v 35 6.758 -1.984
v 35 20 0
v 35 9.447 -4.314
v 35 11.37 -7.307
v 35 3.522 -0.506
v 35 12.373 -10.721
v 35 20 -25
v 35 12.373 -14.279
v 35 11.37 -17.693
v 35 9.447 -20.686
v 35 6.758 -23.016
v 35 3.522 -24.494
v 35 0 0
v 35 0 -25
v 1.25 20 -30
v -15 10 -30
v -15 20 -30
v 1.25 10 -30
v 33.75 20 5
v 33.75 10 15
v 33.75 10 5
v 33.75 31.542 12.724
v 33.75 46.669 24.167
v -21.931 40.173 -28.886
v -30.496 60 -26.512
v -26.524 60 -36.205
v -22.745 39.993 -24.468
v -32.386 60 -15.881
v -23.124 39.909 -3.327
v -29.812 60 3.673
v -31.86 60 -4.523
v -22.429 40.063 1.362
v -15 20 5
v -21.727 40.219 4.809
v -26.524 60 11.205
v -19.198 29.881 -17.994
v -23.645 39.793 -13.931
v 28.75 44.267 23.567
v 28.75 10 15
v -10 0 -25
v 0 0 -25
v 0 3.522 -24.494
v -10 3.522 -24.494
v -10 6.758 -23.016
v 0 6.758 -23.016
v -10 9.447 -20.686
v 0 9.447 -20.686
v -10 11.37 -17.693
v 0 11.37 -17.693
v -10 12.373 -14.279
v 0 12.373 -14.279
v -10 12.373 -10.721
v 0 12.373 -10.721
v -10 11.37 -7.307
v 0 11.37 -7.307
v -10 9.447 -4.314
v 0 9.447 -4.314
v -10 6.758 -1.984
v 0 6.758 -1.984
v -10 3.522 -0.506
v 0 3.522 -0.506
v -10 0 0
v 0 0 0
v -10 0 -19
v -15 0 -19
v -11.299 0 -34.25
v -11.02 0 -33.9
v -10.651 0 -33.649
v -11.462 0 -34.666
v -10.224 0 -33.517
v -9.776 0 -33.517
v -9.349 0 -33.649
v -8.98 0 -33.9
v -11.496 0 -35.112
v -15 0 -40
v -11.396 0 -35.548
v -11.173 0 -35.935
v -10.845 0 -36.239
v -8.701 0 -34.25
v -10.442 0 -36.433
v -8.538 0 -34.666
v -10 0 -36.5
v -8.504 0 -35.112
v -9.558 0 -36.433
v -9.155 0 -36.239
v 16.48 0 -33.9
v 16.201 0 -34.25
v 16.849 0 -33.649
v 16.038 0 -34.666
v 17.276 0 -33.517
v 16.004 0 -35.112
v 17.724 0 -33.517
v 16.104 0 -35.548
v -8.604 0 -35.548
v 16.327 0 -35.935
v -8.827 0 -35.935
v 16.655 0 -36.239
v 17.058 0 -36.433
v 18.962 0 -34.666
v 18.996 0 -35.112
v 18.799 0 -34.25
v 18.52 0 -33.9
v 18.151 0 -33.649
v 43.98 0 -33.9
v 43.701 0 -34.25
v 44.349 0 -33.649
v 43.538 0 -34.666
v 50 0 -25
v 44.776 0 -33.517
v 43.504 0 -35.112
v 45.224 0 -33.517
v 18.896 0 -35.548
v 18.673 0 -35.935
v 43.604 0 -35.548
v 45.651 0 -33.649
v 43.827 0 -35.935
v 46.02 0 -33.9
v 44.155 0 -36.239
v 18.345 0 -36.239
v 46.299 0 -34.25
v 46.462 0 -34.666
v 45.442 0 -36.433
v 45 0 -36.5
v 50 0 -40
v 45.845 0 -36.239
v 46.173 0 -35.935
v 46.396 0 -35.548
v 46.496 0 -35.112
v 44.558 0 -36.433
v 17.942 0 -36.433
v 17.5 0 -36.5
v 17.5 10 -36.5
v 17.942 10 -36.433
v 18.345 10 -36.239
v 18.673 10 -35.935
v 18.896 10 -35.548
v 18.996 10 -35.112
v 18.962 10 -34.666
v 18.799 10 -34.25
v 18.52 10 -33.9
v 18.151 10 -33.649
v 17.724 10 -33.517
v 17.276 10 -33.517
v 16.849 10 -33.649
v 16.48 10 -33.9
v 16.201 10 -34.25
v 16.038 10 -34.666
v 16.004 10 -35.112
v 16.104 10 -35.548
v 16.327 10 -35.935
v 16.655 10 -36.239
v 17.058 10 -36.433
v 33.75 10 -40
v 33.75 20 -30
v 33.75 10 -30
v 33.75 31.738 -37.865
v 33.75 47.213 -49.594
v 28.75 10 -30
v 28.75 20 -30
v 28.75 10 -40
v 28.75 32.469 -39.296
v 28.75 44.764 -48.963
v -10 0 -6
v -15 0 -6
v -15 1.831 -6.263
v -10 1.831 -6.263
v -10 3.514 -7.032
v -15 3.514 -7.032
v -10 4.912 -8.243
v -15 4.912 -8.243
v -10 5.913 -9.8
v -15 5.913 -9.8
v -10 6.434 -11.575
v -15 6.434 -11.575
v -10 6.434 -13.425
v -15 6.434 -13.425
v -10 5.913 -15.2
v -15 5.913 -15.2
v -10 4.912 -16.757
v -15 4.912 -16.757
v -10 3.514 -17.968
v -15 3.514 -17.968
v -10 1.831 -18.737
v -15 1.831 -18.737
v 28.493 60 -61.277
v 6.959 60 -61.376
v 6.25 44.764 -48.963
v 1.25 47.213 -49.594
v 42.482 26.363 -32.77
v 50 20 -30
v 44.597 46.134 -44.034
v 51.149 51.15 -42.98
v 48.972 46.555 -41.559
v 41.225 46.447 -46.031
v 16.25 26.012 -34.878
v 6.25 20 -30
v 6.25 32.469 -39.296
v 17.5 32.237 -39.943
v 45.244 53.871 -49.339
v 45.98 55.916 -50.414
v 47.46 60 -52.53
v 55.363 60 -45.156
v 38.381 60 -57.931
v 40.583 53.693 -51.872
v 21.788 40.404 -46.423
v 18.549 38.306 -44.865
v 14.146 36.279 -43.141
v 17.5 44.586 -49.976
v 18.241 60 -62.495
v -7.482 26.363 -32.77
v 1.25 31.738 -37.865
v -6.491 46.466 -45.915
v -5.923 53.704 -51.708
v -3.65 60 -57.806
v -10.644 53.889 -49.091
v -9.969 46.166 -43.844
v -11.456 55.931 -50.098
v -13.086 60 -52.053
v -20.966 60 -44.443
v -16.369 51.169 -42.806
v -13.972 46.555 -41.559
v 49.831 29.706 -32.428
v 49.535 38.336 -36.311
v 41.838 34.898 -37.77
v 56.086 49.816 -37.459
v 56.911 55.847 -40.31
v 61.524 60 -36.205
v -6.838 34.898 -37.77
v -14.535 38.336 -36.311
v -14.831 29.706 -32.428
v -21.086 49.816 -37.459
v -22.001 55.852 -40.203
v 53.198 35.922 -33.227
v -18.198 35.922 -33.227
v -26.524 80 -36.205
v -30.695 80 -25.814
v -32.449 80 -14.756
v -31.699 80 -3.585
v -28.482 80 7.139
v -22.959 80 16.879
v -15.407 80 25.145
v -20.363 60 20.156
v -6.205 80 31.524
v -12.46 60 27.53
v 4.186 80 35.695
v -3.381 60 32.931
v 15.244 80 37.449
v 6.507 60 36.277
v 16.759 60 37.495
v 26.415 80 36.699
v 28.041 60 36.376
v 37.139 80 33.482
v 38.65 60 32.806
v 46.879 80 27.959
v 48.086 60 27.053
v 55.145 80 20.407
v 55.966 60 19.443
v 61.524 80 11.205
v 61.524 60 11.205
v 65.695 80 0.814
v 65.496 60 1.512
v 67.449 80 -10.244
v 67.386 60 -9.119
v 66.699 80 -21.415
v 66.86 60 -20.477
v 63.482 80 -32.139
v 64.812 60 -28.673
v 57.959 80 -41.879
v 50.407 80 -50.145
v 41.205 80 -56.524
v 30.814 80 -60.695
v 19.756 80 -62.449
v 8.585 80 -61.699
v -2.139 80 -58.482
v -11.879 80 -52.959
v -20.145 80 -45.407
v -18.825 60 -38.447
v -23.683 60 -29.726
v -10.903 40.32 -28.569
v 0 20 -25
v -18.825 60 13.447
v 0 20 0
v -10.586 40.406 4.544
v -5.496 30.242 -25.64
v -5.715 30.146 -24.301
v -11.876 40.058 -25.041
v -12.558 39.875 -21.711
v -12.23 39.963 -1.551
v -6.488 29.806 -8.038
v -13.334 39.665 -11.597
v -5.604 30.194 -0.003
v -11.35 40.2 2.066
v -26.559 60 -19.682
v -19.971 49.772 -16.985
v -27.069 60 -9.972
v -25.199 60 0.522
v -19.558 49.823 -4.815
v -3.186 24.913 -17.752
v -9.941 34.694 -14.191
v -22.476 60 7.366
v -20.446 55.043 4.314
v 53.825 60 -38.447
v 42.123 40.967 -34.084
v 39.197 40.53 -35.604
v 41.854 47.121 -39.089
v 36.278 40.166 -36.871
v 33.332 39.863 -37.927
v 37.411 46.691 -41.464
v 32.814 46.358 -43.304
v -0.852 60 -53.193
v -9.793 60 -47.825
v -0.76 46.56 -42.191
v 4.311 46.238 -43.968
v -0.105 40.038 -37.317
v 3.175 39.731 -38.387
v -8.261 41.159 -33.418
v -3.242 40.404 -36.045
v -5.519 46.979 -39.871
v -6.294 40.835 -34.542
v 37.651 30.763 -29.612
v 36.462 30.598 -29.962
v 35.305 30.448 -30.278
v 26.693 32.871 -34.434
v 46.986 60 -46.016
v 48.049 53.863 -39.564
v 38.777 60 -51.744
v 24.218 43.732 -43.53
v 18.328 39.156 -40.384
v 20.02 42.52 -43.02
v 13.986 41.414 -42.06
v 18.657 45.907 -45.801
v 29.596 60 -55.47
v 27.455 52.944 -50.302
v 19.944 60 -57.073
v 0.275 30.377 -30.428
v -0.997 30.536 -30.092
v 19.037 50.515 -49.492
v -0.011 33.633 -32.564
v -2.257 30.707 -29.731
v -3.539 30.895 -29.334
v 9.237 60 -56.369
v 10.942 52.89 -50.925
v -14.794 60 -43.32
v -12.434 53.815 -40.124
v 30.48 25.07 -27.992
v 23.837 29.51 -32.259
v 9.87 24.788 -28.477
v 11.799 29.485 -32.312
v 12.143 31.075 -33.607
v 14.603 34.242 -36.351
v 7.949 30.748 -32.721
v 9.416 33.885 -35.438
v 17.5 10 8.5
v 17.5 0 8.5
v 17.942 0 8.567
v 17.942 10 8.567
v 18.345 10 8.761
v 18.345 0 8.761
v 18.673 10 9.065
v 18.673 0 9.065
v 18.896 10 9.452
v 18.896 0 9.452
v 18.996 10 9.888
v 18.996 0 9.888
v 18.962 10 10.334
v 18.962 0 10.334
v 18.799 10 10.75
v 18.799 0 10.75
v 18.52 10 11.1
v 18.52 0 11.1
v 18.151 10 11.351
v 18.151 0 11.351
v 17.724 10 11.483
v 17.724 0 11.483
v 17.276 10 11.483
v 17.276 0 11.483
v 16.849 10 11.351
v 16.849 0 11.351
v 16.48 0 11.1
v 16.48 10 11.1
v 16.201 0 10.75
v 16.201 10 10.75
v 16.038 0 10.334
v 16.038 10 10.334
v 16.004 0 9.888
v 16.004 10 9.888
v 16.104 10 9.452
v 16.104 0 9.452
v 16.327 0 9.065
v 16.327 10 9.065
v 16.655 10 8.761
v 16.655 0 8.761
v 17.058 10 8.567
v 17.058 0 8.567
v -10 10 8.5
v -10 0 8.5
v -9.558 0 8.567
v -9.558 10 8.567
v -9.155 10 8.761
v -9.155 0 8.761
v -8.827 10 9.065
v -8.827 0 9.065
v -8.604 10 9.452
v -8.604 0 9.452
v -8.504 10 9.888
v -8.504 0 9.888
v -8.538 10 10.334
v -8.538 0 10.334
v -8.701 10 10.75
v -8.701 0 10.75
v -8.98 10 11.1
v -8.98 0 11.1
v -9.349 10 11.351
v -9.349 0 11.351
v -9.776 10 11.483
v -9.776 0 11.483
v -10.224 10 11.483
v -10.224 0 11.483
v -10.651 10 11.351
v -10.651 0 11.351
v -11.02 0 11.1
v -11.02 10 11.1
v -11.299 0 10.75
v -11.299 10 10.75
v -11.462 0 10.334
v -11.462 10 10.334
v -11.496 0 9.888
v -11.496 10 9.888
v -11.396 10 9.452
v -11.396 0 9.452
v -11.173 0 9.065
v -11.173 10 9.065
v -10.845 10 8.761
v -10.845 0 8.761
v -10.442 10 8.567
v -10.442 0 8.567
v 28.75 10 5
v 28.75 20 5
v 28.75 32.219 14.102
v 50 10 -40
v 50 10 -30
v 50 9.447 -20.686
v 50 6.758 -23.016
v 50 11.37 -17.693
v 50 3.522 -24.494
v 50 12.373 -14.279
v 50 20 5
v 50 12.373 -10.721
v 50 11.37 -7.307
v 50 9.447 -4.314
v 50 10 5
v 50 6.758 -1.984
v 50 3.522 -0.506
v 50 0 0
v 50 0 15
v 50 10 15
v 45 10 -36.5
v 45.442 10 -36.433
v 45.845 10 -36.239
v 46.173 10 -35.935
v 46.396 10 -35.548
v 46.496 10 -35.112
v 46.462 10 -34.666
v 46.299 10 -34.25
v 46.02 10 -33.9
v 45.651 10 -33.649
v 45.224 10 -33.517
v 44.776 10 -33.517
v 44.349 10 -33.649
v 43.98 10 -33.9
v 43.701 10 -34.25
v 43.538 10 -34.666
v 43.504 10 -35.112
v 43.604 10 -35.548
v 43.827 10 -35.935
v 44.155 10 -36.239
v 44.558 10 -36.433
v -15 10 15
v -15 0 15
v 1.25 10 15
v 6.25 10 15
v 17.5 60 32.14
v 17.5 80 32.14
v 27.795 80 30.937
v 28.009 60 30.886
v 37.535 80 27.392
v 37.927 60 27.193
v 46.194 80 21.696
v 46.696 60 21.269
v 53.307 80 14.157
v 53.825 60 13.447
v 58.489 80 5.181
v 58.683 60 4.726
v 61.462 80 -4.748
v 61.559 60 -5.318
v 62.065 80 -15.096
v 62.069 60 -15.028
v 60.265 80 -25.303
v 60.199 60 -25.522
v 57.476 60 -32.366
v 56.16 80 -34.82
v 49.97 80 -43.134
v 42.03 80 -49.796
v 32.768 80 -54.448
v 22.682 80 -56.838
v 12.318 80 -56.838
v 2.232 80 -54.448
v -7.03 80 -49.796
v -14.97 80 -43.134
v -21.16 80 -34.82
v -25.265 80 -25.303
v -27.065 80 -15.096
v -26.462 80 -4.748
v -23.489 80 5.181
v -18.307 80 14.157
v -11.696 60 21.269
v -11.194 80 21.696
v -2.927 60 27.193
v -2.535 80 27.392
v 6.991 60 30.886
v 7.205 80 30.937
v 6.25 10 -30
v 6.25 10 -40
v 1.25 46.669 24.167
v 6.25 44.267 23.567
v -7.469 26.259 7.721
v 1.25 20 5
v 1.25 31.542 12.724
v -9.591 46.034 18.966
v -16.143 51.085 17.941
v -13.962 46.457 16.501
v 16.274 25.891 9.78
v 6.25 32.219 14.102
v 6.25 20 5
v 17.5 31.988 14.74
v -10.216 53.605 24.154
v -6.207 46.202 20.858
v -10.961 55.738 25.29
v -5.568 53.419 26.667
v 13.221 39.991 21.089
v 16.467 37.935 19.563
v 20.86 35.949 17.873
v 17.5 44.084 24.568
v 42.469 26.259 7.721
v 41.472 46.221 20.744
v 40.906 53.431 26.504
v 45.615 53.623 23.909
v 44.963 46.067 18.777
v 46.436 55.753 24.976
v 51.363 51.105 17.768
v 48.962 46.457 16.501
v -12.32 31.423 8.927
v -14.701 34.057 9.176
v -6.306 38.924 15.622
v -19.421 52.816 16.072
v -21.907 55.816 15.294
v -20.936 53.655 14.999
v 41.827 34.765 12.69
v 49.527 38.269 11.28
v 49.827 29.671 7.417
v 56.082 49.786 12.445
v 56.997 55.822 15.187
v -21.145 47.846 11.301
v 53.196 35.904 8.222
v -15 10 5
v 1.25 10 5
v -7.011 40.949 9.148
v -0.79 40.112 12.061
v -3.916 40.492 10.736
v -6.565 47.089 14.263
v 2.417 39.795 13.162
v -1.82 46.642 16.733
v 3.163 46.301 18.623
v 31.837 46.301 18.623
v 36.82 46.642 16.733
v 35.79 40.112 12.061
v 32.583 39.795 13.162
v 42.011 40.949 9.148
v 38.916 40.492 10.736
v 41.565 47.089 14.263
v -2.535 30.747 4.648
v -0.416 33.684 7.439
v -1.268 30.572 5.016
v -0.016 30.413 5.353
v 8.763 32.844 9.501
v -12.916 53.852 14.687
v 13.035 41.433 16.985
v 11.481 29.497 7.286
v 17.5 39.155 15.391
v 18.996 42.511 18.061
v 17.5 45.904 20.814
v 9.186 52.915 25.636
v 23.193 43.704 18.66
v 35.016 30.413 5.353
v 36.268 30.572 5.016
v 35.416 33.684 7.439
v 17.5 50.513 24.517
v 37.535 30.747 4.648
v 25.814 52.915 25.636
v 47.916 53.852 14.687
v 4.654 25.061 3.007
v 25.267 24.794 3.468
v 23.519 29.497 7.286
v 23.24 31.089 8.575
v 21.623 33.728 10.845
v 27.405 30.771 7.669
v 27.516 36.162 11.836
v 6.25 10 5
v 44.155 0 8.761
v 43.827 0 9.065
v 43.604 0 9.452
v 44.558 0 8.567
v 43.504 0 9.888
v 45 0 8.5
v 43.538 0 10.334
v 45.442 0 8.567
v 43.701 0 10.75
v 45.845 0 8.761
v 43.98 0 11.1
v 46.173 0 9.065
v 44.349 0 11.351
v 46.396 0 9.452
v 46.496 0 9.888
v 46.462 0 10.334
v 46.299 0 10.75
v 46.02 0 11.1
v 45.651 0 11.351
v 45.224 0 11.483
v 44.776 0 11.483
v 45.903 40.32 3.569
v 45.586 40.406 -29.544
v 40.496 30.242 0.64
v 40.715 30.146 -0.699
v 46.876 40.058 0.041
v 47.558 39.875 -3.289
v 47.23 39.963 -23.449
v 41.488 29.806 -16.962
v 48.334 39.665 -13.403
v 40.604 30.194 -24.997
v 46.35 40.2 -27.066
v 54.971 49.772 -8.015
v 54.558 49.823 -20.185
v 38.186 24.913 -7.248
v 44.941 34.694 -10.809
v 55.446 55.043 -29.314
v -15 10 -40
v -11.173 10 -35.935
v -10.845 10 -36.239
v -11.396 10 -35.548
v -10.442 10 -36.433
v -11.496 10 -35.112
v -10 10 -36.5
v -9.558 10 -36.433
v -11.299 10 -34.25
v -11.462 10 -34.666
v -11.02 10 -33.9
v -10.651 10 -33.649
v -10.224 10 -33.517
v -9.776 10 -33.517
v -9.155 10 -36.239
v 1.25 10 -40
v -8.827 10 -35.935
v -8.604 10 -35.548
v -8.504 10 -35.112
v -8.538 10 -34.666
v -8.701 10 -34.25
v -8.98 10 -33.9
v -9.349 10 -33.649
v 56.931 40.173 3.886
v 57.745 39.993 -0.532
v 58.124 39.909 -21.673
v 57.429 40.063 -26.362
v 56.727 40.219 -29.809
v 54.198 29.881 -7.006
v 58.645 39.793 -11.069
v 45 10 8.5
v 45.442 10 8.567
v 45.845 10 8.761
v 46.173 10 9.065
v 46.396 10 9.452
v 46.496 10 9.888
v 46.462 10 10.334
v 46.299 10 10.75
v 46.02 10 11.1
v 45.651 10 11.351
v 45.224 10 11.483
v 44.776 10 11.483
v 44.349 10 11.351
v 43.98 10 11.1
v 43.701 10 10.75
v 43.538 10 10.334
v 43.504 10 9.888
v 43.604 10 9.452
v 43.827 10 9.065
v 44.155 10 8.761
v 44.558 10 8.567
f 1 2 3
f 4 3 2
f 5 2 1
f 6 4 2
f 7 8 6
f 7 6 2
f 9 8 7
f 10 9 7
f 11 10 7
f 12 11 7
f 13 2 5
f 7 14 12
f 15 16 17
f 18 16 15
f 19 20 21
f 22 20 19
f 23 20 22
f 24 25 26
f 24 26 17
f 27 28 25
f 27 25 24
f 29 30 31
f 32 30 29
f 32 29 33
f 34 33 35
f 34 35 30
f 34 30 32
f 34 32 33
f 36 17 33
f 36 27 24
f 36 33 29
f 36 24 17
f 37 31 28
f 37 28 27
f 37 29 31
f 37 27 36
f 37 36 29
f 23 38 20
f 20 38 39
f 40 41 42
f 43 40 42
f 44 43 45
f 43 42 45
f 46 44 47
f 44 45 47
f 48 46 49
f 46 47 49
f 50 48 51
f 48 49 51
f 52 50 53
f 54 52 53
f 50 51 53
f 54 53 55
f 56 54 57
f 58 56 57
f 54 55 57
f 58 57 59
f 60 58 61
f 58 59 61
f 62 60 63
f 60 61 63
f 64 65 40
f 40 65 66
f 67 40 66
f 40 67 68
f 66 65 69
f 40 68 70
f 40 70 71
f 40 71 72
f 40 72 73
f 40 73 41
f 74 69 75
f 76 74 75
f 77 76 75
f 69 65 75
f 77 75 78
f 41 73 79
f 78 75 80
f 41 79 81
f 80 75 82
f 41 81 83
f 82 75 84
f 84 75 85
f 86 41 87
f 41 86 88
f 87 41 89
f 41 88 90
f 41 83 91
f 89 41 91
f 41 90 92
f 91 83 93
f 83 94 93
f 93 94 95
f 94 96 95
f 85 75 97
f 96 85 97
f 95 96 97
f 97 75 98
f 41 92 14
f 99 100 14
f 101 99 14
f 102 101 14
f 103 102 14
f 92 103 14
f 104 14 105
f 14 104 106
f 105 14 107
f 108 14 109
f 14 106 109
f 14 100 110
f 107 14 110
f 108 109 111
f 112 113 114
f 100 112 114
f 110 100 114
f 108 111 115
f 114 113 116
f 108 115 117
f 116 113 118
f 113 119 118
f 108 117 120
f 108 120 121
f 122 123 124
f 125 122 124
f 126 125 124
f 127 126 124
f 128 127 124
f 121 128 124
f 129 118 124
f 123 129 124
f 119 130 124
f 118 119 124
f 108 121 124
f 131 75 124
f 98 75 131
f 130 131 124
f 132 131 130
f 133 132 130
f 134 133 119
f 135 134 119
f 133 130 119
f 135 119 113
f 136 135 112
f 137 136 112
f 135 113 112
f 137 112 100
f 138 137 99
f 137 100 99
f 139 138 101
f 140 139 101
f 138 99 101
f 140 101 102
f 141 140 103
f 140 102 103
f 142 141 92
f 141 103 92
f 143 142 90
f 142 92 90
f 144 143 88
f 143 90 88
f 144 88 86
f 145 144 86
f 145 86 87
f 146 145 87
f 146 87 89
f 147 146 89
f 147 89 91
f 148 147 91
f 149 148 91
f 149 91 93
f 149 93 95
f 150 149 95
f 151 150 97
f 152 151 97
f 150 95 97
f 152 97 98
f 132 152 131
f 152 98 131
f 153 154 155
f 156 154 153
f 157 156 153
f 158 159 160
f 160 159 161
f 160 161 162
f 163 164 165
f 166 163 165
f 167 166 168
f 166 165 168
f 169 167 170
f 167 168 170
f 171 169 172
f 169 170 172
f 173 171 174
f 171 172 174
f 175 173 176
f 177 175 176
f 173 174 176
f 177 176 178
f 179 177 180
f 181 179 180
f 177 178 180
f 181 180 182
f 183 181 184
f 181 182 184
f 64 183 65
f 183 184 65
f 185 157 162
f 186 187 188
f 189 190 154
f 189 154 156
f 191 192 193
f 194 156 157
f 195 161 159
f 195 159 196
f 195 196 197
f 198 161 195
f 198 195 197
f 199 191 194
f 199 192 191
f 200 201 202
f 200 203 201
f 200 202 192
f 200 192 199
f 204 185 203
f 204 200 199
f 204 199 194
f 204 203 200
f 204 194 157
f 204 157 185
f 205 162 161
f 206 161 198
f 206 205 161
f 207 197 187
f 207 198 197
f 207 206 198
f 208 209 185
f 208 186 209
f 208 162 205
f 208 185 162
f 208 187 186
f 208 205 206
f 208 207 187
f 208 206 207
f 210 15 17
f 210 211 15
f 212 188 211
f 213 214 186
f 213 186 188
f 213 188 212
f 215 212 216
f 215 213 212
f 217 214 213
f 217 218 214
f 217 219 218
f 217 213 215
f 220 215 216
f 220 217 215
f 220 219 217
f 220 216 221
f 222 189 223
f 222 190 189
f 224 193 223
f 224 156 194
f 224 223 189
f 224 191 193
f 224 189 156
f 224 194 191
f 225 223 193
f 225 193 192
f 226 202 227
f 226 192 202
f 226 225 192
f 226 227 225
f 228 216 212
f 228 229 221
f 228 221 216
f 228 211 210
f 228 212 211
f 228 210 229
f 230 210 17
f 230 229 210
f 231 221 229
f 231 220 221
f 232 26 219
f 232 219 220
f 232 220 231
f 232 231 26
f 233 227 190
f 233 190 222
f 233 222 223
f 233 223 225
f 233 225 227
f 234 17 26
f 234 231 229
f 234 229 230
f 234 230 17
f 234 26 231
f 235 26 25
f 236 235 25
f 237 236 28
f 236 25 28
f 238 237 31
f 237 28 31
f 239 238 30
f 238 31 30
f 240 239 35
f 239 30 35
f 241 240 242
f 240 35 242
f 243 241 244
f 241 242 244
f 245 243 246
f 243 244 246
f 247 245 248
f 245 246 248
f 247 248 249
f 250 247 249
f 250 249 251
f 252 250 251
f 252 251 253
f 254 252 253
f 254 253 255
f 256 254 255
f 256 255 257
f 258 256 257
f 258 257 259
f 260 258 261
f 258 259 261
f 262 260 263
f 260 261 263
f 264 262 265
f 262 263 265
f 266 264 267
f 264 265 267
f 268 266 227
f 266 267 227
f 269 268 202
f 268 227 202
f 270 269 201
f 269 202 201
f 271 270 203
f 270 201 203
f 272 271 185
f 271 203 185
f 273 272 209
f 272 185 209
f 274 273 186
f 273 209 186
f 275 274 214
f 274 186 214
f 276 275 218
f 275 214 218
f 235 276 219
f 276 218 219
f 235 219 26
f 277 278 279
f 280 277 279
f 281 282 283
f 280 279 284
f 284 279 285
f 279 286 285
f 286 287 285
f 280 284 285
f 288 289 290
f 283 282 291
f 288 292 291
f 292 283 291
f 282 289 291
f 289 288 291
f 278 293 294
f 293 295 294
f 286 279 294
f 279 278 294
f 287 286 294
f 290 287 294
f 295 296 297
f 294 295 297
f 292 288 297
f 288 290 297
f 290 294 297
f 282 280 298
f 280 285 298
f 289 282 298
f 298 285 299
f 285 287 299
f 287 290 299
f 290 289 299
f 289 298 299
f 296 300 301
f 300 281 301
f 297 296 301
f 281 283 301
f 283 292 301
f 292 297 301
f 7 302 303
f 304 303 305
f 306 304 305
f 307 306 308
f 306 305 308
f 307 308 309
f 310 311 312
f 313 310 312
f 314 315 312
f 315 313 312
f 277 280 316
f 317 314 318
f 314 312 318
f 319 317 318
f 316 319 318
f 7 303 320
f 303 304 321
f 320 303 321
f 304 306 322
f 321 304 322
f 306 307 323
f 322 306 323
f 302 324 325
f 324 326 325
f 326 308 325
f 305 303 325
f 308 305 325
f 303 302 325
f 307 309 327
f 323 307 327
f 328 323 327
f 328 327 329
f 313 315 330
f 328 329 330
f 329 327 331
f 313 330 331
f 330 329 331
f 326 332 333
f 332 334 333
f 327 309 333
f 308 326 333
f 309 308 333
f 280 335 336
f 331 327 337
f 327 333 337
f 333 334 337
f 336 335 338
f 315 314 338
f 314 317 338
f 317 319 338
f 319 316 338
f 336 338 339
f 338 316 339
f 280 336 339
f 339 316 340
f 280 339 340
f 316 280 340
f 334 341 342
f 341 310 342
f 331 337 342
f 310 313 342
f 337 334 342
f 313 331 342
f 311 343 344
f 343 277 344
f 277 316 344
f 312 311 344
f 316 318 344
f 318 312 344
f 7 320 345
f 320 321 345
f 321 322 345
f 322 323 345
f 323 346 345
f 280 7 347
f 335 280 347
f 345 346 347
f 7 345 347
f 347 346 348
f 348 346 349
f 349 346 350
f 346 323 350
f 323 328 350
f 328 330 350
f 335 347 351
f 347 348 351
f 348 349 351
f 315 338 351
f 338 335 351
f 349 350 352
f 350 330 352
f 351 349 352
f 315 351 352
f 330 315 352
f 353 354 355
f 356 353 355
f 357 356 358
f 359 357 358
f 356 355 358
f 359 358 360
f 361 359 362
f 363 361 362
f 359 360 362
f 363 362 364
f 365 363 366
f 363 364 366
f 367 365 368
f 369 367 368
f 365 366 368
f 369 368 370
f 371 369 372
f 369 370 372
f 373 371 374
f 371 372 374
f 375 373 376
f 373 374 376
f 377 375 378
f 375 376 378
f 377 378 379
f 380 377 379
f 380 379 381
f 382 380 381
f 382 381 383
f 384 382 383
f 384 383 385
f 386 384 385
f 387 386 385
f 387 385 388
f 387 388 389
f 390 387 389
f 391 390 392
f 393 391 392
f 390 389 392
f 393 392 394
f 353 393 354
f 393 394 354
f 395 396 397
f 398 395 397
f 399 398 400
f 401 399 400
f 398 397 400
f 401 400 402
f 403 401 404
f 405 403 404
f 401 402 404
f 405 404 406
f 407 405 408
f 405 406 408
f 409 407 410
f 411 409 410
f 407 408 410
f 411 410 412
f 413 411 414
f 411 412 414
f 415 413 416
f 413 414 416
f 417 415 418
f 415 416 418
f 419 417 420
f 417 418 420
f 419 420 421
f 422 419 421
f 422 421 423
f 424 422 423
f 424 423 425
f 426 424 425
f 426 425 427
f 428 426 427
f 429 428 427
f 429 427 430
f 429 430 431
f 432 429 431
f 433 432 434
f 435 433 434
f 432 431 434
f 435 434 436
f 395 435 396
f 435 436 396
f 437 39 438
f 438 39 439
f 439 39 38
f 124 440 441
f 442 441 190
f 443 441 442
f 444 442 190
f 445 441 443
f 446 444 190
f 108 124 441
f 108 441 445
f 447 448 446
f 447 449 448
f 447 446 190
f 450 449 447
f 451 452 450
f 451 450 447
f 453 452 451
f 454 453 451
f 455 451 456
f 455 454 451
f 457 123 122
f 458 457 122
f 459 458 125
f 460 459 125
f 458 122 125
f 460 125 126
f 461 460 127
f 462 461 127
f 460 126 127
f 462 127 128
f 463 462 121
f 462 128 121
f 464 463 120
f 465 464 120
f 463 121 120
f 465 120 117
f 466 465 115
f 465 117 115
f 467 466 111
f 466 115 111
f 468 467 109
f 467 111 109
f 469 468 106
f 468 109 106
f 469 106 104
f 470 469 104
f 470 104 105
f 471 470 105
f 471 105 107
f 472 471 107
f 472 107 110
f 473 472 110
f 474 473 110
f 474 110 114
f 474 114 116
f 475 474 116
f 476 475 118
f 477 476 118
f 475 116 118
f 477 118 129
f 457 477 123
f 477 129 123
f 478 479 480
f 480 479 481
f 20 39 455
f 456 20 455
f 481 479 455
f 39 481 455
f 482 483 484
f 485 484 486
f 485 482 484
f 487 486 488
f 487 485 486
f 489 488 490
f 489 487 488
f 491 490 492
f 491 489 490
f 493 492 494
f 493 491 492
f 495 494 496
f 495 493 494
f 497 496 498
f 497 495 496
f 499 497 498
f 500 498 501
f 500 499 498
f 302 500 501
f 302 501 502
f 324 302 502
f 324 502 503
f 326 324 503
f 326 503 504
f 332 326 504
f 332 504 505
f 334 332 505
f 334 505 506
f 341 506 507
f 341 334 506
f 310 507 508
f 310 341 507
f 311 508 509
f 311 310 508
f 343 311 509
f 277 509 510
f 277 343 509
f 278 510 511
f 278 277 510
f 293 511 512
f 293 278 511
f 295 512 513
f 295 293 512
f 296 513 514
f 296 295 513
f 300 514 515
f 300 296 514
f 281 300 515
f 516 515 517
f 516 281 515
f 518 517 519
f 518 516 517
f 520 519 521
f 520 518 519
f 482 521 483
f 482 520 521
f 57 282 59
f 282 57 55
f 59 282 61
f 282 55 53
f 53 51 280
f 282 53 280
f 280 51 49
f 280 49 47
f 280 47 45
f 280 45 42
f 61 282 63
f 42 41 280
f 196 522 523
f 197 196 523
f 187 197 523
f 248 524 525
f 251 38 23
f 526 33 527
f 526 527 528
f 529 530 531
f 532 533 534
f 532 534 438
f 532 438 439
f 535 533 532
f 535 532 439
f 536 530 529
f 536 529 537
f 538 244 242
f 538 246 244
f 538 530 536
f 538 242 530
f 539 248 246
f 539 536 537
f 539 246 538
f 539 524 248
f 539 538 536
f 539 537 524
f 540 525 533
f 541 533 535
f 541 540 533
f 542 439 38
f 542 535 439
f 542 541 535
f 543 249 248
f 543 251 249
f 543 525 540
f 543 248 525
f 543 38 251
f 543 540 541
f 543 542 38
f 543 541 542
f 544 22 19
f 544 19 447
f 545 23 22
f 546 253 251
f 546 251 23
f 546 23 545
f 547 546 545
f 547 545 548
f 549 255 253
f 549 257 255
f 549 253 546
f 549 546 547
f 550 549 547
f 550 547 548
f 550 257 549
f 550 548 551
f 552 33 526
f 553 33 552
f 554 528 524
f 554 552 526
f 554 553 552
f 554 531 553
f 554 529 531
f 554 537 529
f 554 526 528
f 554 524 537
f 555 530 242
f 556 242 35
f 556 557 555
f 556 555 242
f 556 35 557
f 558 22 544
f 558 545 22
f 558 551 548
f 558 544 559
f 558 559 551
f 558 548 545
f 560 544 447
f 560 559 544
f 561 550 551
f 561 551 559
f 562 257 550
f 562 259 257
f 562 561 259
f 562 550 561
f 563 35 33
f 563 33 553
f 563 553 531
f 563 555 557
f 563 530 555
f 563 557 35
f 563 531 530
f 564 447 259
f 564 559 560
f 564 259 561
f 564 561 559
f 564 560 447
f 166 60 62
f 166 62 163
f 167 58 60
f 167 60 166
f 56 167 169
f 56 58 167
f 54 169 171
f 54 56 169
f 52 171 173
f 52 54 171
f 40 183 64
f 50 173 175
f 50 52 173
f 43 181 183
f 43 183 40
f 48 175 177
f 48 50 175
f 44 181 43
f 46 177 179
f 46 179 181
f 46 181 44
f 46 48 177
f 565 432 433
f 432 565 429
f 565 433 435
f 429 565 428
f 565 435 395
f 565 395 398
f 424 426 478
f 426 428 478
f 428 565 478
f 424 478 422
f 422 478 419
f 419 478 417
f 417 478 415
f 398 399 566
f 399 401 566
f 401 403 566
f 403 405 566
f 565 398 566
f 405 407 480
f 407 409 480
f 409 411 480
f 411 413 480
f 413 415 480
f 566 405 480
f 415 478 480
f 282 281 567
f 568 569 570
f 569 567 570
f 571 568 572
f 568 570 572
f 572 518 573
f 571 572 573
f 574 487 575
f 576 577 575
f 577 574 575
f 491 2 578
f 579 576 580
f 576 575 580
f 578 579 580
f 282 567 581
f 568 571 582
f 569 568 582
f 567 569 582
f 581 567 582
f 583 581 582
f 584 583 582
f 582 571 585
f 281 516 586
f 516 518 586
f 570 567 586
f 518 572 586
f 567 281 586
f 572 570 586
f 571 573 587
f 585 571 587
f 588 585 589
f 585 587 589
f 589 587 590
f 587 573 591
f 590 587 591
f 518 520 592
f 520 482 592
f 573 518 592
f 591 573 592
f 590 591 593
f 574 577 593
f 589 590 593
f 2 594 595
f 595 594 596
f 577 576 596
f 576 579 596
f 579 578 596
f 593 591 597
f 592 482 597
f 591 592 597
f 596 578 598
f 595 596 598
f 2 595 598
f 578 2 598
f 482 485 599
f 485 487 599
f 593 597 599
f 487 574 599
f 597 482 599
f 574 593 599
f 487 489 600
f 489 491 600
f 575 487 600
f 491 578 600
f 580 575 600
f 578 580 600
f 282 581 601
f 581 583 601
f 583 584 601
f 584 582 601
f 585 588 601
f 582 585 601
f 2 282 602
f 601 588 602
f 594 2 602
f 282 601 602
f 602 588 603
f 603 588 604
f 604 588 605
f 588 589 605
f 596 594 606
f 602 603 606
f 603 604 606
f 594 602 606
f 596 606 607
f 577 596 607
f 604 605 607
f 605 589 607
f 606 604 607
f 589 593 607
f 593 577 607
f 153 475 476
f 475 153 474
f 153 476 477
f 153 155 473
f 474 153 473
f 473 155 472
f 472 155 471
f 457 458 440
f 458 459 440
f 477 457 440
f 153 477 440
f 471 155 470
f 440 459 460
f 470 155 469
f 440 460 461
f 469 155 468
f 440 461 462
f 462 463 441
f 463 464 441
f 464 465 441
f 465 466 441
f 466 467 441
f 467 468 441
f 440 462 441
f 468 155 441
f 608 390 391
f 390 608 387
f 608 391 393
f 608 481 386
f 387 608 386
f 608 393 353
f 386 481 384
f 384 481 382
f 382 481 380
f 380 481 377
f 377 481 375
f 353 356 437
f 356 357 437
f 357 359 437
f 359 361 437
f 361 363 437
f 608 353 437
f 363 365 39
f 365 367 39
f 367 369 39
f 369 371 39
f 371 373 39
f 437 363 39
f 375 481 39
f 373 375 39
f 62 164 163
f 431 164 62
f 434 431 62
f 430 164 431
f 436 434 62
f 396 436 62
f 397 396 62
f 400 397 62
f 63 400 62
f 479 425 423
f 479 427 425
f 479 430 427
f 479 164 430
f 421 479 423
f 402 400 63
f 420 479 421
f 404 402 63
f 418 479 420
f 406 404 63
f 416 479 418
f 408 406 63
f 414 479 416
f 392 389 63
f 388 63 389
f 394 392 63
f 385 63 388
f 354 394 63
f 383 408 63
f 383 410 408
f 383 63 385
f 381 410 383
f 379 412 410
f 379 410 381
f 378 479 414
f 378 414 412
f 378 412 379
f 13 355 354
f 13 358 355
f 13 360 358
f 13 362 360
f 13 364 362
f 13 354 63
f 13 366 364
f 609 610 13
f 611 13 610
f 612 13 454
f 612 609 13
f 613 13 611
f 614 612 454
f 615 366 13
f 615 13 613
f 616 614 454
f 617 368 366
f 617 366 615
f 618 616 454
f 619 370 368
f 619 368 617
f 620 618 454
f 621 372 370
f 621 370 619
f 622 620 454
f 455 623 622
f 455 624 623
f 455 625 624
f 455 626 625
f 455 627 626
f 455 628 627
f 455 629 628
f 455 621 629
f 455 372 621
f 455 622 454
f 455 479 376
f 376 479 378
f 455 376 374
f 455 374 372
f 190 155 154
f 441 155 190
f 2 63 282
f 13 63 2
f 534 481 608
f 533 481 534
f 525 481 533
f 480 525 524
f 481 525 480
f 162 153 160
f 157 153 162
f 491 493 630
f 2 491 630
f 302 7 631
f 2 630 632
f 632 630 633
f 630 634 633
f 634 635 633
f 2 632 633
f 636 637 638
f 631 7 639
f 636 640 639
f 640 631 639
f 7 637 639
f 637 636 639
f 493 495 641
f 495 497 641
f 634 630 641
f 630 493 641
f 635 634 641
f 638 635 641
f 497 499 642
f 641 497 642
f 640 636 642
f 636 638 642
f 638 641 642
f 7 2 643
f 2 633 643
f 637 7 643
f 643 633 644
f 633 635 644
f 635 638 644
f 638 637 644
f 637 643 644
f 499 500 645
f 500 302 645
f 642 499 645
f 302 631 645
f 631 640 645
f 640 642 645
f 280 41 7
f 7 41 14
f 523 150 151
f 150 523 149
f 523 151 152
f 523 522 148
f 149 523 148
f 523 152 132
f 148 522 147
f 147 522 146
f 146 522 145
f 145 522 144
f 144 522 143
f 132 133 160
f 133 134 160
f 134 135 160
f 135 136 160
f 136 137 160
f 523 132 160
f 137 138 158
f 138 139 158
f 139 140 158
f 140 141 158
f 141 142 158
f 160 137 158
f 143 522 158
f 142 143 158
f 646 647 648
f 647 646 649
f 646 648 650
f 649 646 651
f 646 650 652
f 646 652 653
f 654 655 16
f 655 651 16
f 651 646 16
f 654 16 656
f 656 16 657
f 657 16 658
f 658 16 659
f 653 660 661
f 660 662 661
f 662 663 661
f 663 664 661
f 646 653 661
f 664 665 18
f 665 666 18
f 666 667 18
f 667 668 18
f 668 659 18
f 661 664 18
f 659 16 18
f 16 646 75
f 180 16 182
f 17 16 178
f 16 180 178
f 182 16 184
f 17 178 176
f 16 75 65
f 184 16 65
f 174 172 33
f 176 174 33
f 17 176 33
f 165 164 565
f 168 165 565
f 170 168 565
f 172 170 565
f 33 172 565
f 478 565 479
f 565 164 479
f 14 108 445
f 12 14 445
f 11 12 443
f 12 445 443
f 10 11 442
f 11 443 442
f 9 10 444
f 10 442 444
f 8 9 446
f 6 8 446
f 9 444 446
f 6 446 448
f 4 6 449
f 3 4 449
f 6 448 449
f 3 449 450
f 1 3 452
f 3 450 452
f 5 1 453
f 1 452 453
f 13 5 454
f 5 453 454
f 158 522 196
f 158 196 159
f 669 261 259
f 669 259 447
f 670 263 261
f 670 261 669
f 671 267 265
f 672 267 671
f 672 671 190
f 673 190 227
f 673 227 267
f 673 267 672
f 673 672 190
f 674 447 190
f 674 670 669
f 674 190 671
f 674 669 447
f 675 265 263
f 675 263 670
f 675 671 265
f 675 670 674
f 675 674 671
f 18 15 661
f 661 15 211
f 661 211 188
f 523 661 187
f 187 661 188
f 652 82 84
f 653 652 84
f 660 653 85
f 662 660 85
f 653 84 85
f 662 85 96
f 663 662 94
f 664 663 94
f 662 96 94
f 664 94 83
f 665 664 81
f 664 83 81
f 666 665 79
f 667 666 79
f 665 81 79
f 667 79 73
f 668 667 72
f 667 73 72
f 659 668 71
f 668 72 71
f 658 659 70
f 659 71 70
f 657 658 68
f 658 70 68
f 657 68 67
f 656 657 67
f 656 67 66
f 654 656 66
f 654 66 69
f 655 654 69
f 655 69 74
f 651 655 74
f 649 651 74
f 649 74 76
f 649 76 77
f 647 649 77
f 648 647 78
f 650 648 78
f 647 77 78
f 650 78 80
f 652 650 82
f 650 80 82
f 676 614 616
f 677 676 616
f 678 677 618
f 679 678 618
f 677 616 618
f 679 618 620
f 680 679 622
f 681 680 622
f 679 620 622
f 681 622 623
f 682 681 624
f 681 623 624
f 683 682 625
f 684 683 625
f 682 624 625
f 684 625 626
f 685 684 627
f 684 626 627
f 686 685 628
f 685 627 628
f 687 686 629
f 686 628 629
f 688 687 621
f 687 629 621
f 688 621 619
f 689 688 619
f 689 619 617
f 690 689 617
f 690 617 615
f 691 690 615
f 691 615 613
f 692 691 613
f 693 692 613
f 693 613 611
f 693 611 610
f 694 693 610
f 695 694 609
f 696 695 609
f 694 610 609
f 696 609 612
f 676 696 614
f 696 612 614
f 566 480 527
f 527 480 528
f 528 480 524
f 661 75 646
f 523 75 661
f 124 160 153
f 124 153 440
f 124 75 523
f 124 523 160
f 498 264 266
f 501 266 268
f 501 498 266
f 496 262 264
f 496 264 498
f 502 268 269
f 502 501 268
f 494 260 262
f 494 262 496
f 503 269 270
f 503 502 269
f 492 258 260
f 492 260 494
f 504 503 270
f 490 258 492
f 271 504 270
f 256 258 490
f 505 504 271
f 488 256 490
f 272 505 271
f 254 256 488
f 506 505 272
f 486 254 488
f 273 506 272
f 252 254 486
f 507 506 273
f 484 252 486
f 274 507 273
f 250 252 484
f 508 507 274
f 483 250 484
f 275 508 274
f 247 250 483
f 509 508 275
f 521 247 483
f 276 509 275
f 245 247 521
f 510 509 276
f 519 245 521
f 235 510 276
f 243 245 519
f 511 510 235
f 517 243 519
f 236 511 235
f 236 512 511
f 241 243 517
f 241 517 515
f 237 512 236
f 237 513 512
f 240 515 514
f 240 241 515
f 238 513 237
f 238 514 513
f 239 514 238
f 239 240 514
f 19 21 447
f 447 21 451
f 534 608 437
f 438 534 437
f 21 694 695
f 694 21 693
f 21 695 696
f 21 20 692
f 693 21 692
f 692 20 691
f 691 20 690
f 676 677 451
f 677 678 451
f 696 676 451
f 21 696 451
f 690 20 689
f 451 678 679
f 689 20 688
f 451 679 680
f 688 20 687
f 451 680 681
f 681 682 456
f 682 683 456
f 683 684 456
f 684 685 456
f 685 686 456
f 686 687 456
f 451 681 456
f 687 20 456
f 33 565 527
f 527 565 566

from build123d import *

# Parameters (mm, degrees)
CROQUIS2_W              = 65
CROQUIS2_H              = 35
CROQUIS2_W_2            = 35
CROQUIS2_H_2            = 25
SALIENTE_EXTRUIR1_DEPTH = 20
CROQUIS3_R              = 12.5
CORTAR_EXTRUIR1_DEPTH   = 60
CROQUIS4_R              = 6.5
CORTAR_EXTRUIR2_DEPTH   = 5
CROQUIS10_R             = 50
CROQUIS10_R_2           = 44.640302452
SALIENTE_EXTRUIR2_DEPTH = 20
CROQUIS11_W             = 65
CROQUIS11_H             = 10
CROQUIS11_R             = 1.5
SALIENTE_EXTRUIR3_DEPTH = 10
SALIENTE_EXTRUIR4_DEPTH = 2.5


with BuildPart() as part:
    # Croquis2 → Saliente-Extruir1 (new body)
    with BuildSketch(Plane(origin=(0, 0, 0), x_dir=(1, 0, 0), z_dir=(0, 1, 0))):
        with Locations((17.5, 12.5)):
            Rectangle(CROQUIS2_W, CROQUIS2_H)
        with Locations((17.5, 12.5)):
            Rectangle(CROQUIS2_W_2, CROQUIS2_H_2, mode=Mode.SUBTRACT)
    extrude(amount=SALIENTE_EXTRUIR1_DEPTH)

    # Croquis3 → Cortar-Extruir1 (cut)
    with BuildSketch(Plane(origin=(50, 0, 0), x_dir=(0, 0, -1), z_dir=(1, 0, 0))):
        with Locations((12.5, 0)):
            Circle(CROQUIS3_R)
    extrude(amount=-CORTAR_EXTRUIR1_DEPTH, mode=Mode.SUBTRACT)

    # Croquis4 → Cortar-Extruir2 (cut)
    with BuildSketch(Plane.ZY.offset(15)):
        with Locations((-12.5, 0)):
            Circle(CROQUIS4_R)
    extrude(amount=-CORTAR_EXTRUIR2_DEPTH, mode=Mode.SUBTRACT)

    # Croquis5 → Recubrir2 section 0
    with BuildSketch(Plane(origin=(0, 20, 0), x_dir=(1, 0, 0), z_dir=(0, 1, 0))):
        with BuildLine():
            Line((-15, -5), (50, -5))
            Line((50, -5), (50, 30))
            Line((50, 30), (-15, 30))
            Line((-15, 30), (-15, -5))
        make_face()
    # Croquis6 for Recubrir2 → Recubrir2 section 1
    with BuildSketch(Plane(origin=(0, 60, 0), x_dir=(1, 0, 0), z_dir=(0, 1, 0))):
        with BuildLine():
            # circular arc as an exact rational Bezier (weights 1, cos(half-angle), 1)
            Bezier((-26.523554996, -11.204991152), (17.5, -92.963021858), (61.523554996, -11.204991152), weights=[1, 0.474099823, 1])
            Bezier((61.523554996, -11.204991152), (74.287781001, 12.5), (61.523554996, 36.204991152), weights=[1, 0.8804711, 1])
            Bezier((61.523554996, 36.204991152), (17.5, 117.963021858), (-26.523554996, 36.204991152), weights=[1, 0.474099823, 1])
            Bezier((-26.523554996, 36.204991152), (-39.287781001, 12.5), (-26.523554996, -11.204991152), weights=[1, 0.8804711, 1])
        make_face()
    loft()

    # Croquis10 → Saliente-Extruir2 (add)
    with BuildSketch(Plane(origin=(0, 60, 0), x_dir=(1, 0, 0), z_dir=(0, 1, 0))):
        with Locations(Location((17.5, 12.5, 0), (0, 0, 151.699244219))):
            Circle(CROQUIS10_R)
        with Locations(Location((17.5, 12.5, 0), (0, 0, 270))):
            Circle(CROQUIS10_R_2, mode=Mode.SUBTRACT)
    extrude(amount=SALIENTE_EXTRUIR2_DEPTH)

    # Croquis11 → Saliente-Extruir3 (add)
    # profile 1 of 2: a face of its own
    with BuildSketch(Plane.XZ):
        with Locations((17.5, 10)):
            Rectangle(CROQUIS11_W, CROQUIS11_H)
        with Locations(Location((45, 10, 0), (0, 0, 270))):
            Circle(CROQUIS11_R, mode=Mode.SUBTRACT)
        with Locations(Location((-10, 10, 0), (0, 0, 270))):
            Circle(CROQUIS11_R, mode=Mode.SUBTRACT)
        with Locations(Location((17.5, 10, 0), (0, 0, 270))):
            Circle(CROQUIS11_R, mode=Mode.SUBTRACT)
    # profile 2 of 2: a face of its own
    with BuildSketch(Plane.XZ):
        with Locations((17.5, -35)):
            Rectangle(CROQUIS11_W, CROQUIS11_H)
        with Locations(Location((45, -35, 0), (0, 0, 270))):
            Circle(CROQUIS11_R, mode=Mode.SUBTRACT)
        with Locations(Location((-10, -35, 0), (0, 0, 270))):
            Circle(CROQUIS11_R, mode=Mode.SUBTRACT)
        with Locations(Location((17.5, -35, 0), (0, 0, 270))):
            Circle(CROQUIS11_R, mode=Mode.SUBTRACT)
    extrude(amount=-SALIENTE_EXTRUIR3_DEPTH)

    # Croquis12 → Saliente-Extruir4 (add, symmetric)
    with BuildSketch(Plane(origin=(31.25, 0, 0), x_dir=(0, 0, -1), z_dir=(1, 0, 0))):
        Polygon((-5, 10), (-5, 50), (-25, 50), (-15, 10), align=None)
        Polygon((30, 10), (40, 10), (50.3125, 50), (30, 50), align=None)
    saliente_extruir4 = extrude(amount=SALIENTE_EXTRUIR4_DEPTH, both=True)

    # Simetría1: Saliente-Extruir4 across plane
    add(saliente_extruir4.mirror(Plane(origin=(17.5, 0, 0), x_dir=(0, 0, 1), z_dir=(1, 0, 0))))

    # Croquis9 → Cortar-Recubrir2 section 0
    with BuildSketch(Plane(origin=(0, 20, 0), x_dir=(1, 0, 0), z_dir=(0, 1, 0))):
        with BuildLine():
            Line((0, 0), (35, 0))
            Line((35, 0), (35, 25))
            Line((35, 25), (0, 25))
            Line((0, 25), (0, 0))
        make_face()
    # Croquis8 for Cortar-Recub → Cortar-Recubrir2 section 1
    with BuildSketch(Plane(origin=(0, 60, 0), x_dir=(1, 0, 0), z_dir=(0, 1, 0))):
        with BuildLine():
            Bezier((-18.82530827, -13.446648764), (17.5, -64.302080343), (53.82530827, -13.446648764), weights=[1, 0.581238194, 1])
            Bezier((53.82530827, -13.446648764), (72.358628816, 12.5), (53.82530827, 38.446648764), weights=[1, 0.813733471, 1])
            Bezier((53.82530827, 38.446648764), (17.5, 89.302080343), (-18.82530827, 38.446648764), weights=[1, 0.581238194, 1])
            Bezier((-18.82530827, 38.446648764), (-37.358628816, 12.5), (-18.82530827, -13.446648764), weights=[1, 0.813733471, 1])
        make_face()
    loft(mode=Mode.SUBTRACT)


solid = part.part
